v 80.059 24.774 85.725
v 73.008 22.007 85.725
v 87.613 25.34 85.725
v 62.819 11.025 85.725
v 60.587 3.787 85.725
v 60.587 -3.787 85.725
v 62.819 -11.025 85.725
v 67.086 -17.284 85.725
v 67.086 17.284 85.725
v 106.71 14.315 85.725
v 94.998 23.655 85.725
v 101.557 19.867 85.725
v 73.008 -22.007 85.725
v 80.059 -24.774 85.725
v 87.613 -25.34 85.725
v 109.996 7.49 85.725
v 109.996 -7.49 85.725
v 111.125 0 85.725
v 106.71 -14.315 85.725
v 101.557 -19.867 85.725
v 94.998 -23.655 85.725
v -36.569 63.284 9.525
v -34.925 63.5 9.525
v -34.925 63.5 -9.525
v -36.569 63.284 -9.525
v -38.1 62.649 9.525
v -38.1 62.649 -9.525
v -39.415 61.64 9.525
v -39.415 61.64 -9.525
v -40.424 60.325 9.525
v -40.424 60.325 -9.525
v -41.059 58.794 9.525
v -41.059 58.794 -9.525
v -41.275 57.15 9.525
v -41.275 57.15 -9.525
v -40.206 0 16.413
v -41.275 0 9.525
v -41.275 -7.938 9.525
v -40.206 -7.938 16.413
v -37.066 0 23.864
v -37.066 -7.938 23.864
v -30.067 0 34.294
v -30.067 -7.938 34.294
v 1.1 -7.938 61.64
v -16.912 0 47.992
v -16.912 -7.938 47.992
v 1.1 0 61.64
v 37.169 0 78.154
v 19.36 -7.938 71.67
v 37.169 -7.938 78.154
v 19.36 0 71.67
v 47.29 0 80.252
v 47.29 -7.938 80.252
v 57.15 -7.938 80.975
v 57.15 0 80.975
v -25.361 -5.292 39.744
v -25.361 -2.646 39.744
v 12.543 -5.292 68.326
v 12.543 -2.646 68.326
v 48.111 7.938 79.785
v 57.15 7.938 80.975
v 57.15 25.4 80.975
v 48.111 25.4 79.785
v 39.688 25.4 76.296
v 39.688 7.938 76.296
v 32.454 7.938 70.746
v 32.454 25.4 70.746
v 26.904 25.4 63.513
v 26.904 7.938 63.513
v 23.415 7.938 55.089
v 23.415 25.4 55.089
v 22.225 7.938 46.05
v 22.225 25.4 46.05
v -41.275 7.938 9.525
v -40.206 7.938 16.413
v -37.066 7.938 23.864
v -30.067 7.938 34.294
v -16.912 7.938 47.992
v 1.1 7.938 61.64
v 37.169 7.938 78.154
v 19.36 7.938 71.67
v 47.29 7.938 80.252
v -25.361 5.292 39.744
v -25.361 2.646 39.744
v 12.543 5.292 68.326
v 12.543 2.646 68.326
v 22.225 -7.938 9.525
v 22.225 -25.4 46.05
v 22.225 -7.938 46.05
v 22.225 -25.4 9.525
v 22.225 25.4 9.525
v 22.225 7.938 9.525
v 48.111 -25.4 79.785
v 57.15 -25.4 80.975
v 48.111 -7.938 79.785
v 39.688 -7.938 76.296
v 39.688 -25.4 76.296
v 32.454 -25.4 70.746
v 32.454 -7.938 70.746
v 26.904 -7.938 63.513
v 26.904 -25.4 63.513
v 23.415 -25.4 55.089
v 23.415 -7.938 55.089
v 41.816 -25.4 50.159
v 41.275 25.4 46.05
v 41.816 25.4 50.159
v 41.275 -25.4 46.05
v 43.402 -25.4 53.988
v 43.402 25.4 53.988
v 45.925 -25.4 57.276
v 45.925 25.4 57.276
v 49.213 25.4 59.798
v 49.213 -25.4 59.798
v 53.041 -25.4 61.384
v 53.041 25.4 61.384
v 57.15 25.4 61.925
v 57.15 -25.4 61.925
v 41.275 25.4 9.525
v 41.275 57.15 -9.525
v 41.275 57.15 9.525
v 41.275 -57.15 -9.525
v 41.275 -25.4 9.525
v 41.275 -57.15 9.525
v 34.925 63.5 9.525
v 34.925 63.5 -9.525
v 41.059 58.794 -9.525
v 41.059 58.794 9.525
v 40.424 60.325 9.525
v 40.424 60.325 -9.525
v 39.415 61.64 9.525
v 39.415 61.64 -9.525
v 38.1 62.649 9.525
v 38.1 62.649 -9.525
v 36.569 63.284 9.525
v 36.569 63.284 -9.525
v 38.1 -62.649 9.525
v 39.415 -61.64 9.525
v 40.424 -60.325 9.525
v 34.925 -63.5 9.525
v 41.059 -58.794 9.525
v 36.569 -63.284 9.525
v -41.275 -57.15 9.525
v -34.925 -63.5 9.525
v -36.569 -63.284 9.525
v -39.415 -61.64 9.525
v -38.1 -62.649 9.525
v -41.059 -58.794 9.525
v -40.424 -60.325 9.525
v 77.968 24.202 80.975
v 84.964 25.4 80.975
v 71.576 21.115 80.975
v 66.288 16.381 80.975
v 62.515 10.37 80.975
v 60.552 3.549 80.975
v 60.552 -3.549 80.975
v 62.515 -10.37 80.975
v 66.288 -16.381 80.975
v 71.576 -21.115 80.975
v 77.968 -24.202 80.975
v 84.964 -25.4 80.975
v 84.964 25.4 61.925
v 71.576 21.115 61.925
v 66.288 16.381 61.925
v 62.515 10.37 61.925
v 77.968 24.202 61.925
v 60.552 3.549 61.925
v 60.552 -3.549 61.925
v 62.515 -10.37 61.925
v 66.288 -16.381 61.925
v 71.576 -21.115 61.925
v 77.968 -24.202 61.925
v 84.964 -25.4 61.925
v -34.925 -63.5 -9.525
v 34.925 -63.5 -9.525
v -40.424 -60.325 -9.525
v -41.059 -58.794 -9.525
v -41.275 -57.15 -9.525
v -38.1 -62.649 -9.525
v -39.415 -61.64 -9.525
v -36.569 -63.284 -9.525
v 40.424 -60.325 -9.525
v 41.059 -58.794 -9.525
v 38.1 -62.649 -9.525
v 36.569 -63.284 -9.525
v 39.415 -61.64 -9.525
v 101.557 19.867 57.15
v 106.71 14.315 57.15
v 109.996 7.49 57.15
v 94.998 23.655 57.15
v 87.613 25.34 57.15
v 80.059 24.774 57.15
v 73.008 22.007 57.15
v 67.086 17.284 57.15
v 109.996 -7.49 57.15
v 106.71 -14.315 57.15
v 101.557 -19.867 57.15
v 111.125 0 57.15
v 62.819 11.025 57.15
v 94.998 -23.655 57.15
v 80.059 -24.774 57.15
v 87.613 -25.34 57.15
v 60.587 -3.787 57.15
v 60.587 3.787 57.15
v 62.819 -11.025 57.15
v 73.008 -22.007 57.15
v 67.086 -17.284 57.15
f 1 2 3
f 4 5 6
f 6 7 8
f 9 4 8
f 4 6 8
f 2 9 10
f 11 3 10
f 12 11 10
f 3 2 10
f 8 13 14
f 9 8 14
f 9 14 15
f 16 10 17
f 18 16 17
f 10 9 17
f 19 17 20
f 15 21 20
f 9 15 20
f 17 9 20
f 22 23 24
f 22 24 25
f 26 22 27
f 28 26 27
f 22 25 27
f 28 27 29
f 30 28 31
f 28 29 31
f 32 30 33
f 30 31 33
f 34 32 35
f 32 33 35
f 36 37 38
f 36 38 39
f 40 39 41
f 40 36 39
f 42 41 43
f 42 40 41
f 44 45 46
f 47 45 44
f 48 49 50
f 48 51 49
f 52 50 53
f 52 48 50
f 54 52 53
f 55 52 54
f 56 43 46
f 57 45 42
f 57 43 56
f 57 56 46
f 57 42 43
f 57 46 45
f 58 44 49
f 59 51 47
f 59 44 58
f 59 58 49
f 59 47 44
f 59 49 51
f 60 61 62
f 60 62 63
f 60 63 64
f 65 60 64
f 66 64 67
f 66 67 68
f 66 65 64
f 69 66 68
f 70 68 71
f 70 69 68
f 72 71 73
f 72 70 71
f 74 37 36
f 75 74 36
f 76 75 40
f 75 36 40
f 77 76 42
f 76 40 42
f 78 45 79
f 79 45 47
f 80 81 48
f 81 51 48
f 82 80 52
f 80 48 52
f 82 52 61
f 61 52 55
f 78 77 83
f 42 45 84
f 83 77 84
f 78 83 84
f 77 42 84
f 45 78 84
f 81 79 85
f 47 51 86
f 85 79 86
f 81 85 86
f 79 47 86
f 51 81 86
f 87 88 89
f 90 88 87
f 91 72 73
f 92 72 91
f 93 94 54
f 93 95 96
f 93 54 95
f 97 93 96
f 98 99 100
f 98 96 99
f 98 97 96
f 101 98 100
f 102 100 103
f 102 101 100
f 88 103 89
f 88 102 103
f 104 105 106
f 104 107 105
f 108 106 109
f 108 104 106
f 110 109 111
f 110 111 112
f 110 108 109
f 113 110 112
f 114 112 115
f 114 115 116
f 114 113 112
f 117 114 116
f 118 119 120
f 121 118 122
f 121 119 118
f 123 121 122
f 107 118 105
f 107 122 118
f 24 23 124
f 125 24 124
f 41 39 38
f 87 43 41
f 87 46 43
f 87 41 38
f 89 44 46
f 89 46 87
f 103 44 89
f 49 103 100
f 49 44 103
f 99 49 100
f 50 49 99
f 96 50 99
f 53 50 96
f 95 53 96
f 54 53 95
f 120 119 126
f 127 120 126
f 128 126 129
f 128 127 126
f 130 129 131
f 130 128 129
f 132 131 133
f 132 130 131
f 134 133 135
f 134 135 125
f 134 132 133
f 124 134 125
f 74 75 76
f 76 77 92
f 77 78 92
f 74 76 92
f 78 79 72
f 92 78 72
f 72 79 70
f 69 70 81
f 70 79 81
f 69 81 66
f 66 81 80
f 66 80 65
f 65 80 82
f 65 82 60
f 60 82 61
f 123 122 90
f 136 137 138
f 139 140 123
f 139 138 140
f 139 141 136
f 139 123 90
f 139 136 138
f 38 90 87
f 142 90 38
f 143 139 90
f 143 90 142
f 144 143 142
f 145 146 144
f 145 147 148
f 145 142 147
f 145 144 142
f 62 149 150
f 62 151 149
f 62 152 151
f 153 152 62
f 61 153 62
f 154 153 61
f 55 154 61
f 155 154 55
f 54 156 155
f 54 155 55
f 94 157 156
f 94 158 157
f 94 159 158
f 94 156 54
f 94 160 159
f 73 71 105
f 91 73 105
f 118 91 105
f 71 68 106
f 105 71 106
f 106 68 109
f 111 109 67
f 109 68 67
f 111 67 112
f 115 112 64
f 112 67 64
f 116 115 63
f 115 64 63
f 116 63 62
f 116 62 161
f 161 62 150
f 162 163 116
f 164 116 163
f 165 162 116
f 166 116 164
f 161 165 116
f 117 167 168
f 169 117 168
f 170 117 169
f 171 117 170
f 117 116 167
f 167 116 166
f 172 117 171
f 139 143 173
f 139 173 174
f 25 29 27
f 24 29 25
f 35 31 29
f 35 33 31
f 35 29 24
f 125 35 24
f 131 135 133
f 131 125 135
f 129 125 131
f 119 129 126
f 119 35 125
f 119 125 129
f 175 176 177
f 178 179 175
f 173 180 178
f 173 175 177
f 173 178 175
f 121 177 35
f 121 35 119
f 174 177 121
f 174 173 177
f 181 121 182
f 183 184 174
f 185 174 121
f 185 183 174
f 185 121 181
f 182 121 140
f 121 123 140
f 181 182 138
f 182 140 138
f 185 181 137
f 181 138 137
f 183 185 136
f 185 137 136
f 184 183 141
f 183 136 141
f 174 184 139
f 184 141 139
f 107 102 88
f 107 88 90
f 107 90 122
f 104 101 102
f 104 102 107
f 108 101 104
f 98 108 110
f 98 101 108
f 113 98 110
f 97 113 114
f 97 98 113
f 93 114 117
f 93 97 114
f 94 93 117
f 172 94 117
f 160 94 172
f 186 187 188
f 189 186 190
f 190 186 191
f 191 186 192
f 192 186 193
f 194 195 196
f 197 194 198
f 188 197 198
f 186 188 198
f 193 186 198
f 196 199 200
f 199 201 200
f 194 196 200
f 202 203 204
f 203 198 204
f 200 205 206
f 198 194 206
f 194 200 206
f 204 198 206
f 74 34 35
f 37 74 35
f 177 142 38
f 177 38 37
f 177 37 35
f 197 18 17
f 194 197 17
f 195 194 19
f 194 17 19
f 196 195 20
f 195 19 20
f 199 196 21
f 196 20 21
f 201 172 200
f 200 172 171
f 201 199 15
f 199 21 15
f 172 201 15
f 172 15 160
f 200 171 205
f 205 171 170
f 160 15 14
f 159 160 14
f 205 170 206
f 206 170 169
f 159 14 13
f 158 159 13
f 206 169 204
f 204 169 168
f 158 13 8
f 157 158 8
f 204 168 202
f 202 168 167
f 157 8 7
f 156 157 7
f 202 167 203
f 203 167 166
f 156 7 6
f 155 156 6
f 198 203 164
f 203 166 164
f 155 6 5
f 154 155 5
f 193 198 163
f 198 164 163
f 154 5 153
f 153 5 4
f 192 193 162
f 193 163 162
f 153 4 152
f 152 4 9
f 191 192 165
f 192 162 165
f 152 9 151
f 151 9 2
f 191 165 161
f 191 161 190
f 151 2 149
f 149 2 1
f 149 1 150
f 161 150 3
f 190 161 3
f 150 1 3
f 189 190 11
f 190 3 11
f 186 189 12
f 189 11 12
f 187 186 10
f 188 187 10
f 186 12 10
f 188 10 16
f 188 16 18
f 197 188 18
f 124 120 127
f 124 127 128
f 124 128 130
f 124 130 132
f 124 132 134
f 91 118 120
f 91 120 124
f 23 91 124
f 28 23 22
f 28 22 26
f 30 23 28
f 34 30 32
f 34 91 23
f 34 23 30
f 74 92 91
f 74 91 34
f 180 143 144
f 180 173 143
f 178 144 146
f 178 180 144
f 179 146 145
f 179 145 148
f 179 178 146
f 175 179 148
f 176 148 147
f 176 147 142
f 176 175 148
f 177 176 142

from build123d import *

# Parameters (mm, degrees)
F1_DEPTH = 63.5
F0_W     = 25.3889229774
F0_H     = 19.05
F2_DEPTH = 25.4
F3_DEPTH = 7.9375
F5_R     = 6.35


with BuildPart() as f1:
    # F0 (on Front) → F1 (new body, symmetric)
    with BuildSketch(Plane.XZ):
        Polygon((41.275, -9.525), (41.275, 9.525), (22.225, 9.525), (-41.275, 9.525), (-41.275, -9.525), align=None)
    extrude(amount=F1_DEPTH, both=True)

    # F0 (on Front) → F2 (join, symmetric)
    with BuildSketch(Plane.XZ):
        with Locations((73.0194614887, 71.4502)):
            Rectangle(F0_W, F0_H)
        with BuildLine():
            Line((22.225, 9.525), (41.275, 9.525))
            Line((41.275, 9.525), (41.275, 46.0502))
            ThreePointArc((41.275, 46.0502), (45.9246798487, 57.2755201513), (57.15, 61.9252))
            Line((57.15, 61.9252), (60.325, 61.9252))
            Line((60.325, 61.9252), (60.325, 80.9752))
            Line((60.325, 80.9752), (57.15, 80.9752))
            ThreePointArc((57.15, 80.9752), (32.4542956671, 70.7459043329), (22.225, 46.0502))
            Line((22.225, 46.0502), (22.225, 9.525))
        make_face()
    extrude(amount=F2_DEPTH, both=True)

    # F0 (on Front) → F3 (join, symmetric)
    with BuildSketch(Plane.XZ):
        with BuildLine():
            Line((-41.275, 9.525), (22.225, 9.525))
            Line((22.225, 9.525), (22.225, 46.0502))
            ThreePointArc((22.225, 46.0502), (32.4542956671, 70.7459043329), (57.15, 80.9752))
            add(Edge.make_bspline(
                [(-41.275, 9.525), (-41.4512120187, 35.7986353338), (14.2870573327, 81.0561999679), (57.15, 80.9752)],
                knots=[0, 0, 0, 0, 121.6248811101, 121.6248811101, 121.6248811101, 121.6248811101], degree=3))
        make_face()
    extrude(amount=F3_DEPTH, both=True)

    # F0 (on Front) → F4 (revolve)
    with BuildSketch(Plane.XZ):
        Polygon((85.7139229774, 80.9752), (85.7139229774, 61.9252), (85.7139229774, 57.15), (111.125, 57.15), (111.125, 85.725), (85.7139229774, 85.725), align=None)
    revolve(axis=Axis((85.7139229774, 0, 71.4375), (0, 0, -1)))

    # F5
    f5_edges = [f1.edges().sort_by_distance(p)[0] for p in [
        (41.275, -63.5, 0),
        (-41.275, -63.5, 0),
        (-41.275, 63.5, 0),
        (41.275, 63.5, 0),
    ]]
    fillet(f5_edges, radius=F5_R)


solid = f1.part
